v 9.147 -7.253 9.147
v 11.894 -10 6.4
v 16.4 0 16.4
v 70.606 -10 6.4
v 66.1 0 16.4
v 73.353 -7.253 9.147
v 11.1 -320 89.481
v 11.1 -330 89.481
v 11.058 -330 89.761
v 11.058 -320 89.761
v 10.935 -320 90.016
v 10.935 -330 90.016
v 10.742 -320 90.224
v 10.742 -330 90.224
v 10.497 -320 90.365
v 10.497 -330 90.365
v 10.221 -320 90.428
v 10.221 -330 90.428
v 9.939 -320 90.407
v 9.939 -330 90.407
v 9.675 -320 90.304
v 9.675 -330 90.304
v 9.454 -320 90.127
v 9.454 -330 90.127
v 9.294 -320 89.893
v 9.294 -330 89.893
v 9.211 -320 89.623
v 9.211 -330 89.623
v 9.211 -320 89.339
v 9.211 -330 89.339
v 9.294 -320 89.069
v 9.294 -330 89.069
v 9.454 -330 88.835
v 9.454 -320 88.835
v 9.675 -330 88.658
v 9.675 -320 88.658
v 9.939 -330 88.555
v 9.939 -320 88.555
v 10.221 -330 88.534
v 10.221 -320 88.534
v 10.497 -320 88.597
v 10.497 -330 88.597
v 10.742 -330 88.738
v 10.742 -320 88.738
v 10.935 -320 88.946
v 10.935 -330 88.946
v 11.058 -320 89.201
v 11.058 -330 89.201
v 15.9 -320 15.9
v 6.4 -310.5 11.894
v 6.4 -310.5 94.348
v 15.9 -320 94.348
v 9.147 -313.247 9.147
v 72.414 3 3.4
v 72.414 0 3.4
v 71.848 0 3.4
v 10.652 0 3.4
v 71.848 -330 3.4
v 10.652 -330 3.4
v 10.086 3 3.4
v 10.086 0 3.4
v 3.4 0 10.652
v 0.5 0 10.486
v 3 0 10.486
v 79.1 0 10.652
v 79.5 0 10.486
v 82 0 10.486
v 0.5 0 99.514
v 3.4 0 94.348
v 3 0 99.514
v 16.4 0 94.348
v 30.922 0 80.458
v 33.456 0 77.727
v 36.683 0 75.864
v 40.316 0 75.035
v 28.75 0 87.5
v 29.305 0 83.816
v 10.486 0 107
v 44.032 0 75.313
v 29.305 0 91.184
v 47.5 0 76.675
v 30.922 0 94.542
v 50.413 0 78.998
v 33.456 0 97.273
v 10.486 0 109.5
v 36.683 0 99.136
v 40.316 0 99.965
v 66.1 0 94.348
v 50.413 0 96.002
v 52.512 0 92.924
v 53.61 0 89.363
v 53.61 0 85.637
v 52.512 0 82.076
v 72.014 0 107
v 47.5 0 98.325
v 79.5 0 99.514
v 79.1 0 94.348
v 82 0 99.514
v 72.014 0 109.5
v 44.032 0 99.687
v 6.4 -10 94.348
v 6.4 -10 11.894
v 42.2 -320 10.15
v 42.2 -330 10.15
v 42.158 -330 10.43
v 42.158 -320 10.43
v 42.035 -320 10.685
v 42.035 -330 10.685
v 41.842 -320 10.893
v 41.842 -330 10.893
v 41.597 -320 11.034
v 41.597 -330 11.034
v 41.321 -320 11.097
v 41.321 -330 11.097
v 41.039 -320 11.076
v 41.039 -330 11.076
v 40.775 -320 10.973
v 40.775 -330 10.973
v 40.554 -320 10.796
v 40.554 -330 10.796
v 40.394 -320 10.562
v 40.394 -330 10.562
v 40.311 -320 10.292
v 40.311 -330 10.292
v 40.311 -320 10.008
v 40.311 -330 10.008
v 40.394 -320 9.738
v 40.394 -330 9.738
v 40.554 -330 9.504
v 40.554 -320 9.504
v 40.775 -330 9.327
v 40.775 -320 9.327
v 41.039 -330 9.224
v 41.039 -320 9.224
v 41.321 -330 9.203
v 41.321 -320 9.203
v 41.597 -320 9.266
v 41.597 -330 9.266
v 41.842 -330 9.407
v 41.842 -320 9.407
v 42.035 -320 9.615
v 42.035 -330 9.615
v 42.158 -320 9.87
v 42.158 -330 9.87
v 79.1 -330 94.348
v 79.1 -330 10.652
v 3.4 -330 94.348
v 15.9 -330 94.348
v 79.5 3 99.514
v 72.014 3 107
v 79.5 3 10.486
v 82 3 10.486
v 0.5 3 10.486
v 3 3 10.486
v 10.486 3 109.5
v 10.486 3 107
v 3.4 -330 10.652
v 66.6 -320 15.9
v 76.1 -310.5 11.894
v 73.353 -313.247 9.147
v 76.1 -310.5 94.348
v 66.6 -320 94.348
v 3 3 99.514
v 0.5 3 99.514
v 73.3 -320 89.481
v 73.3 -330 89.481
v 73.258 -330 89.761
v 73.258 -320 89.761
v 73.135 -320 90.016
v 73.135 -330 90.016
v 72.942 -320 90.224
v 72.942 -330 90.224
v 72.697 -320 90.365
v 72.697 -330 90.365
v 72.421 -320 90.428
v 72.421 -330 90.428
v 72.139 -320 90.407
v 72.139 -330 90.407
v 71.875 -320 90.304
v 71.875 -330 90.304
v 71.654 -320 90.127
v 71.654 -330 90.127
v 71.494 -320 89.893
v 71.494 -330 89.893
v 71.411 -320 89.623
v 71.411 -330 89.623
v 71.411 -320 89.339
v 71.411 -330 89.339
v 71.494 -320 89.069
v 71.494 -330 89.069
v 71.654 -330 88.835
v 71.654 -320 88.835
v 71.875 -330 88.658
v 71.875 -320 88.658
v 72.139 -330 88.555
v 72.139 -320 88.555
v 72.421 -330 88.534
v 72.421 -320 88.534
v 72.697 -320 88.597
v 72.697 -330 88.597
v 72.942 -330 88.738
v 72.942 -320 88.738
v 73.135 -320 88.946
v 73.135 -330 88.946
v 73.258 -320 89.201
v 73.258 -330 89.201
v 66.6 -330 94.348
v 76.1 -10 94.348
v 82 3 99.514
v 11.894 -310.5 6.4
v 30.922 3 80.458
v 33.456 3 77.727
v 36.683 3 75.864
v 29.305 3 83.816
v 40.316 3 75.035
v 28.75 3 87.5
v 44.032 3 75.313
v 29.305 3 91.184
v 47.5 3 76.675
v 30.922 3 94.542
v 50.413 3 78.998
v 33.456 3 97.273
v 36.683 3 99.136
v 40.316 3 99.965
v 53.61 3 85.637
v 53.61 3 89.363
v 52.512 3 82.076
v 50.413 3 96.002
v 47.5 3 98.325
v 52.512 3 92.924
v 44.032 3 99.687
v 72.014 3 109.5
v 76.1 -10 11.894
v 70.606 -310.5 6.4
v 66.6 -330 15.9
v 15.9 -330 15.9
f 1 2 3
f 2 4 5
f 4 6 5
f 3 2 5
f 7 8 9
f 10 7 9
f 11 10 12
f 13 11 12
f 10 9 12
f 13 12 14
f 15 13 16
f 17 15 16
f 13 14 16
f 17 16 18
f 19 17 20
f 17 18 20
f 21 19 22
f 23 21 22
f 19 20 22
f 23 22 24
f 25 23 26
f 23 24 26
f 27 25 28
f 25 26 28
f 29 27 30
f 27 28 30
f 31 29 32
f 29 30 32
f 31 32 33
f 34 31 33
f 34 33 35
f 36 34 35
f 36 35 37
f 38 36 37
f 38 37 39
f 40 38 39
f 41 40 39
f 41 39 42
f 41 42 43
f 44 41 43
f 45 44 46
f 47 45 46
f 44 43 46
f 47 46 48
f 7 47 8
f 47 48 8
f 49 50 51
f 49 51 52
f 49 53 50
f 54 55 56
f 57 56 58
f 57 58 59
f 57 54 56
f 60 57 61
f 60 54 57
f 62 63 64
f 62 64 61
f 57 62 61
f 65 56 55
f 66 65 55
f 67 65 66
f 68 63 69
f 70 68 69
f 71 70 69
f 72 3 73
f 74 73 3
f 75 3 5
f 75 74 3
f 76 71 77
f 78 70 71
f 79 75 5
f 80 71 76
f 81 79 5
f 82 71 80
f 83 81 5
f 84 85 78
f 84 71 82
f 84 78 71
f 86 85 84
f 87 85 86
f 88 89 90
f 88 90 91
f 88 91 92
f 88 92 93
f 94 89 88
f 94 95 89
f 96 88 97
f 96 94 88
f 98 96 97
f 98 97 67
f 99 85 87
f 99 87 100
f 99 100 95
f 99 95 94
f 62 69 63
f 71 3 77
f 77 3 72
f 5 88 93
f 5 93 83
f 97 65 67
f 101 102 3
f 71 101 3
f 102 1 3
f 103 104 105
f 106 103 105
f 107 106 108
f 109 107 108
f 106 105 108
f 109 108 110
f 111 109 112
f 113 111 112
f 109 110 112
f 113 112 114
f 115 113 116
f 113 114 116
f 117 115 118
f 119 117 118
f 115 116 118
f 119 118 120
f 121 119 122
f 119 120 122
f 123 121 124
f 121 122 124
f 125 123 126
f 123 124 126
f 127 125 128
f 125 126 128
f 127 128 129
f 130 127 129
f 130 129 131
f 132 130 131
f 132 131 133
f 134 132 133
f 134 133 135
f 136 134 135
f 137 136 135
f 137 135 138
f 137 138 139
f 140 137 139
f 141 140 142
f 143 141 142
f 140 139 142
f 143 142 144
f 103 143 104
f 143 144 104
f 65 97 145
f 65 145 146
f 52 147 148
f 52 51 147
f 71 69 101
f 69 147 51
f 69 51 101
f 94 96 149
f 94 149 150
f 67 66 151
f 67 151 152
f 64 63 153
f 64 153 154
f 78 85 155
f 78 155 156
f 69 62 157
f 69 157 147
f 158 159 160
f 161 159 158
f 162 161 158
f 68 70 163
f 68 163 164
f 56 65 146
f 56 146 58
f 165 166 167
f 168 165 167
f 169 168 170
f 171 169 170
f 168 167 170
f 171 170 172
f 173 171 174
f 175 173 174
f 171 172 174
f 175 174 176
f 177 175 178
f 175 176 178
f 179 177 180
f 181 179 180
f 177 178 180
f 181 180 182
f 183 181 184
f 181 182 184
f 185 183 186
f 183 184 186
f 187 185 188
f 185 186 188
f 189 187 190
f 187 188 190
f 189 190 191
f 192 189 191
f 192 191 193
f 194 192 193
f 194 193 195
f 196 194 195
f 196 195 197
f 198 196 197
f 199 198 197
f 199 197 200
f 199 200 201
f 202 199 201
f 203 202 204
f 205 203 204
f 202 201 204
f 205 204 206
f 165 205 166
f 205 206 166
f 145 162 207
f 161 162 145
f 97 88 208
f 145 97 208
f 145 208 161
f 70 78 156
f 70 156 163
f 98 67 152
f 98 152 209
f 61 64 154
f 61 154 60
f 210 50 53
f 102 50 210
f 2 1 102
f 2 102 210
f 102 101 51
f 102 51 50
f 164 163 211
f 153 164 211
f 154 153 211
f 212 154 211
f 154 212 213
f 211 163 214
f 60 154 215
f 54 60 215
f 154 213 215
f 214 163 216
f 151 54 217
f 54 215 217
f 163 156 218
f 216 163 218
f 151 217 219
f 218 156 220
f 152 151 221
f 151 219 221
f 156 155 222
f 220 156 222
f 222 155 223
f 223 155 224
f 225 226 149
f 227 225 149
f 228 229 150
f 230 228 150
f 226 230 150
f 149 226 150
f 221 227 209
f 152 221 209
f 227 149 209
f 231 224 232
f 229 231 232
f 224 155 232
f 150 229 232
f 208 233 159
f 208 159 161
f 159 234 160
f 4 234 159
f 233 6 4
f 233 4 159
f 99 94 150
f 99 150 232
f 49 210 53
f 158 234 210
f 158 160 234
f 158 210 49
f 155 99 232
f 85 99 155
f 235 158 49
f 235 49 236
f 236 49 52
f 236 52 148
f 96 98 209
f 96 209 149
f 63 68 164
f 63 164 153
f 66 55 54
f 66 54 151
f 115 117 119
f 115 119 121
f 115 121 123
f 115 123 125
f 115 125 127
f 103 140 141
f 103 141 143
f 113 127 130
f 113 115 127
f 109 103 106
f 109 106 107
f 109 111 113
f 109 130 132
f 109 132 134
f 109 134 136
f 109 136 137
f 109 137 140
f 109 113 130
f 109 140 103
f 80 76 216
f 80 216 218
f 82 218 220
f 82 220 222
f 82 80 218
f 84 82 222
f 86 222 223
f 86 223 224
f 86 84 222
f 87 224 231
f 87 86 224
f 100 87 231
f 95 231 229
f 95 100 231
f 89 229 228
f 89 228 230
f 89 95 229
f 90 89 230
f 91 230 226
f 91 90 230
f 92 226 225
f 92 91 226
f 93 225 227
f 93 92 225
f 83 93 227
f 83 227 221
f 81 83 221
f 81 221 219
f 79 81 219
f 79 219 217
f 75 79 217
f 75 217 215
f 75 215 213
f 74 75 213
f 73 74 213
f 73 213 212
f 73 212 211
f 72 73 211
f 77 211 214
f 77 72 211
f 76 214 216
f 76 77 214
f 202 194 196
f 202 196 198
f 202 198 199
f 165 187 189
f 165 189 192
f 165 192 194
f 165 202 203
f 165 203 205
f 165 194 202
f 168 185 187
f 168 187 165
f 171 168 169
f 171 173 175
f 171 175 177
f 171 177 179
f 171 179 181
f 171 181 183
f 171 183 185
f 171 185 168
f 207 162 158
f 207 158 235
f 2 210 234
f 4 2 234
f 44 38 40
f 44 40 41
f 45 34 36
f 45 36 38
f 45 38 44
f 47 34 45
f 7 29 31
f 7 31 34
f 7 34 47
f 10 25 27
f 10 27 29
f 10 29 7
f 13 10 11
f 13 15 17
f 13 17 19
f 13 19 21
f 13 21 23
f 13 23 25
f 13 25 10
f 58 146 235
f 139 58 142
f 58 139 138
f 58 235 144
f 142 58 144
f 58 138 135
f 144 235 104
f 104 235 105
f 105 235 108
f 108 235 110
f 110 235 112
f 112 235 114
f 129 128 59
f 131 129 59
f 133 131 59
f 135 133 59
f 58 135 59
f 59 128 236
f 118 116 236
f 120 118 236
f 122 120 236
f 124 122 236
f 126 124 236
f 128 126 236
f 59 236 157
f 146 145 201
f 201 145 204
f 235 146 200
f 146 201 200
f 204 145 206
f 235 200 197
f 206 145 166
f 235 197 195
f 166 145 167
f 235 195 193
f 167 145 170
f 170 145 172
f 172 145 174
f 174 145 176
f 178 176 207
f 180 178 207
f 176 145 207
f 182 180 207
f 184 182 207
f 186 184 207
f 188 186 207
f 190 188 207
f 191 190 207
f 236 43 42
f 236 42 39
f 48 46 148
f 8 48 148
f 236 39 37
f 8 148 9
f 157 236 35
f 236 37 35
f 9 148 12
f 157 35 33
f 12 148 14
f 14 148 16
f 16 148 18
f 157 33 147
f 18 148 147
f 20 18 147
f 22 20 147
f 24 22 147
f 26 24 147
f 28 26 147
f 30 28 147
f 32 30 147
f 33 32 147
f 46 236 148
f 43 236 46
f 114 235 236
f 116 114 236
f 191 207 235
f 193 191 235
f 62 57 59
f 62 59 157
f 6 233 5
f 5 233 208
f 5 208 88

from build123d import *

# Parameters (mm, degrees)
SKETCH010_R      = 0.95
EXTRUDE011_DEPTH = 10
EXTRUDE012_DEPTH = 50
SKETCH002_R      = 12.5
EXTRUDE002_DEPTH = 3
EXTRUDE001_DEPTH = 330
EXTRUDE013_DEPTH = 50


with BuildPart() as back_holes_e:
    # Sketch010 → Extrude011 (new body)
    with BuildSketch(Plane.XZ.offset(330)):
        with Locations((10.15, 89.481014)):
            Circle(SKETCH010_R)
        with Locations((72.35, 89.481014)):
            Circle(SKETCH010_R)
        with Locations((41.25, 10.15)):
            Circle(SKETCH010_R)
    extrude(amount=-EXTRUDE011_DEPTH)


with BuildPart() as drawer_back_support_negative_e:
    # Sketch014 (on Face14 of Extrude001) → Extrude012 (new body)
    with BuildSketch(Plane.XZ.offset(330)):
        Polygon((71.848171, 3.4), (79.1, 10.651829), (82.5, 10.651829), (82.5, 0), (0, 0), (0, 10.651829), (3.4, 10.651829), (10.651829, 3.4), align=None)
    extrude(amount=-EXTRUDE012_DEPTH)


with BuildPart() as drawer_back_support001:
    # Sweep: sweep along a path in Sketch012
    with BuildLine(Plane.XZ.offset(330)) as sweep_path:
        Line((15.9, 94.348171), (15.9, 15.9))
        Line((15.9, 15.9), (66.6, 15.9))
        Line((66.6, 15.9), (66.6, 94.348171))
    # Sketch009 (on Edge32 of Extrude001) → Sweep (sweep)
    with BuildSketch(Plane(origin=(52.866667, -110, 94.348171), x_dir=(-1, 0, 0), z_dir=(0, 0, -1))):
        Polygon((46.466667, -220), (36.966667, -220), (36.966667, -210), (46.466667, -200.5), align=None)
    sweep(path=sweep_path.line, is_frenet=True, transition=Transition.RIGHT)

    # Cut: cut drawer_back_support_negative_e
    add(drawer_back_support_negative_e.part, mode=Mode.SUBTRACT)

    # Cut002: cut back_holes_e
    add(back_holes_e.part, mode=Mode.SUBTRACT)


with BuildPart() as drawer_front_e:
    # Sketch002 (on Face13 of Extrude001) → Extrude002 (new body)
    with BuildSketch(Plane(origin=(0, 0, 0), x_dir=(-1, 0, 0), z_dir=(0, 1, 0))):
        Polygon((-82, 99.513856), (-79.5, 99.513856), (-72.013856, 107), (-72.013856, 109.5), (-10.486144, 109.5), (-10.486144, 107), (-3, 99.513856), (-0.5, 99.513856), (-0.5, 10.486144), (-3, 10.486144), (-10.086144, 3.4), (-10.651829, 3.4), (-71.848171, 3.4), (-72.413856, 3.4), (-79.5, 10.486144), (-82, 10.486144), align=None)
        with Locations((-41.25, 87.5)):
            Circle(SKETCH002_R, mode=Mode.SUBTRACT)
    extrude(amount=EXTRUDE002_DEPTH)


with BuildPart() as drawer_tube_e:
    # Sketch (on Face17 of Extrude) → Extrude001 (new body)
    with BuildSketch(Plane(origin=(0, 0, 0), x_dir=(-1, 0, 0), z_dir=(0, 1, 0))):
        Polygon((-79.1, 10.651829), (-71.848171, 3.4), (-10.651829, 3.4), (-3.4, 10.651829), (-3.4, 94.348171), (-6.4, 94.348171), (-6.4, 11.89447), (-11.89447, 6.4), (-70.60553, 6.4), (-76.1, 11.89447), (-76.1, 94.348171), (-79.1, 94.348171), align=None)
    extrude(amount=-EXTRUDE001_DEPTH)


with BuildPart() as drawer_front_support_negative_e:
    # Sketch015 (on Face13 of Extrude001) → Extrude013 (new body)
    with BuildSketch(Plane(origin=(0, 0, 0), x_dir=(-1, 0, 0), z_dir=(0, 1, 0))):
        Polygon((-3.4, 10.651829), (0, 10.651829), (0, 0), (-82.5, 0), (-82.5, 10.651829), (-79.1, 10.651829), (-71.848171, 3.4), (-10.651829, 3.4), align=None)
    extrude(amount=-EXTRUDE013_DEPTH)


with BuildPart() as drawer_inside:
    # Sweep001: sweep along a path in Sketch013
    with BuildLine(Plane.XZ) as sweep001_path:
        Line((16.4, 94.348171), (16.4, 16.4))
        Line((16.4, 16.4), (66.1, 16.4))
        Line((66.1, 16.4), (66.1, 94.348171))
    # Sketch011 (on Face6 of Extrude001) → Sweep001 (sweep)
    with BuildSketch(Plane.XY.offset(94.348171)):
        Polygon((6.4, 0), (6.4, -10), (16.4, 0), align=None)
    sweep(path=sweep001_path.line, is_frenet=True, transition=Transition.RIGHT)

    # Cut001: cut drawer_front_support_negative_e
    add(drawer_front_support_negative_e.part, mode=Mode.SUBTRACT)

    # Fusion: union drawer_back_support001, drawer_front_e, drawer_tube_e
    add(drawer_back_support001.part)
    add(drawer_front_e.part)
    add(drawer_tube_e.part)


solid = drawer_inside.part
